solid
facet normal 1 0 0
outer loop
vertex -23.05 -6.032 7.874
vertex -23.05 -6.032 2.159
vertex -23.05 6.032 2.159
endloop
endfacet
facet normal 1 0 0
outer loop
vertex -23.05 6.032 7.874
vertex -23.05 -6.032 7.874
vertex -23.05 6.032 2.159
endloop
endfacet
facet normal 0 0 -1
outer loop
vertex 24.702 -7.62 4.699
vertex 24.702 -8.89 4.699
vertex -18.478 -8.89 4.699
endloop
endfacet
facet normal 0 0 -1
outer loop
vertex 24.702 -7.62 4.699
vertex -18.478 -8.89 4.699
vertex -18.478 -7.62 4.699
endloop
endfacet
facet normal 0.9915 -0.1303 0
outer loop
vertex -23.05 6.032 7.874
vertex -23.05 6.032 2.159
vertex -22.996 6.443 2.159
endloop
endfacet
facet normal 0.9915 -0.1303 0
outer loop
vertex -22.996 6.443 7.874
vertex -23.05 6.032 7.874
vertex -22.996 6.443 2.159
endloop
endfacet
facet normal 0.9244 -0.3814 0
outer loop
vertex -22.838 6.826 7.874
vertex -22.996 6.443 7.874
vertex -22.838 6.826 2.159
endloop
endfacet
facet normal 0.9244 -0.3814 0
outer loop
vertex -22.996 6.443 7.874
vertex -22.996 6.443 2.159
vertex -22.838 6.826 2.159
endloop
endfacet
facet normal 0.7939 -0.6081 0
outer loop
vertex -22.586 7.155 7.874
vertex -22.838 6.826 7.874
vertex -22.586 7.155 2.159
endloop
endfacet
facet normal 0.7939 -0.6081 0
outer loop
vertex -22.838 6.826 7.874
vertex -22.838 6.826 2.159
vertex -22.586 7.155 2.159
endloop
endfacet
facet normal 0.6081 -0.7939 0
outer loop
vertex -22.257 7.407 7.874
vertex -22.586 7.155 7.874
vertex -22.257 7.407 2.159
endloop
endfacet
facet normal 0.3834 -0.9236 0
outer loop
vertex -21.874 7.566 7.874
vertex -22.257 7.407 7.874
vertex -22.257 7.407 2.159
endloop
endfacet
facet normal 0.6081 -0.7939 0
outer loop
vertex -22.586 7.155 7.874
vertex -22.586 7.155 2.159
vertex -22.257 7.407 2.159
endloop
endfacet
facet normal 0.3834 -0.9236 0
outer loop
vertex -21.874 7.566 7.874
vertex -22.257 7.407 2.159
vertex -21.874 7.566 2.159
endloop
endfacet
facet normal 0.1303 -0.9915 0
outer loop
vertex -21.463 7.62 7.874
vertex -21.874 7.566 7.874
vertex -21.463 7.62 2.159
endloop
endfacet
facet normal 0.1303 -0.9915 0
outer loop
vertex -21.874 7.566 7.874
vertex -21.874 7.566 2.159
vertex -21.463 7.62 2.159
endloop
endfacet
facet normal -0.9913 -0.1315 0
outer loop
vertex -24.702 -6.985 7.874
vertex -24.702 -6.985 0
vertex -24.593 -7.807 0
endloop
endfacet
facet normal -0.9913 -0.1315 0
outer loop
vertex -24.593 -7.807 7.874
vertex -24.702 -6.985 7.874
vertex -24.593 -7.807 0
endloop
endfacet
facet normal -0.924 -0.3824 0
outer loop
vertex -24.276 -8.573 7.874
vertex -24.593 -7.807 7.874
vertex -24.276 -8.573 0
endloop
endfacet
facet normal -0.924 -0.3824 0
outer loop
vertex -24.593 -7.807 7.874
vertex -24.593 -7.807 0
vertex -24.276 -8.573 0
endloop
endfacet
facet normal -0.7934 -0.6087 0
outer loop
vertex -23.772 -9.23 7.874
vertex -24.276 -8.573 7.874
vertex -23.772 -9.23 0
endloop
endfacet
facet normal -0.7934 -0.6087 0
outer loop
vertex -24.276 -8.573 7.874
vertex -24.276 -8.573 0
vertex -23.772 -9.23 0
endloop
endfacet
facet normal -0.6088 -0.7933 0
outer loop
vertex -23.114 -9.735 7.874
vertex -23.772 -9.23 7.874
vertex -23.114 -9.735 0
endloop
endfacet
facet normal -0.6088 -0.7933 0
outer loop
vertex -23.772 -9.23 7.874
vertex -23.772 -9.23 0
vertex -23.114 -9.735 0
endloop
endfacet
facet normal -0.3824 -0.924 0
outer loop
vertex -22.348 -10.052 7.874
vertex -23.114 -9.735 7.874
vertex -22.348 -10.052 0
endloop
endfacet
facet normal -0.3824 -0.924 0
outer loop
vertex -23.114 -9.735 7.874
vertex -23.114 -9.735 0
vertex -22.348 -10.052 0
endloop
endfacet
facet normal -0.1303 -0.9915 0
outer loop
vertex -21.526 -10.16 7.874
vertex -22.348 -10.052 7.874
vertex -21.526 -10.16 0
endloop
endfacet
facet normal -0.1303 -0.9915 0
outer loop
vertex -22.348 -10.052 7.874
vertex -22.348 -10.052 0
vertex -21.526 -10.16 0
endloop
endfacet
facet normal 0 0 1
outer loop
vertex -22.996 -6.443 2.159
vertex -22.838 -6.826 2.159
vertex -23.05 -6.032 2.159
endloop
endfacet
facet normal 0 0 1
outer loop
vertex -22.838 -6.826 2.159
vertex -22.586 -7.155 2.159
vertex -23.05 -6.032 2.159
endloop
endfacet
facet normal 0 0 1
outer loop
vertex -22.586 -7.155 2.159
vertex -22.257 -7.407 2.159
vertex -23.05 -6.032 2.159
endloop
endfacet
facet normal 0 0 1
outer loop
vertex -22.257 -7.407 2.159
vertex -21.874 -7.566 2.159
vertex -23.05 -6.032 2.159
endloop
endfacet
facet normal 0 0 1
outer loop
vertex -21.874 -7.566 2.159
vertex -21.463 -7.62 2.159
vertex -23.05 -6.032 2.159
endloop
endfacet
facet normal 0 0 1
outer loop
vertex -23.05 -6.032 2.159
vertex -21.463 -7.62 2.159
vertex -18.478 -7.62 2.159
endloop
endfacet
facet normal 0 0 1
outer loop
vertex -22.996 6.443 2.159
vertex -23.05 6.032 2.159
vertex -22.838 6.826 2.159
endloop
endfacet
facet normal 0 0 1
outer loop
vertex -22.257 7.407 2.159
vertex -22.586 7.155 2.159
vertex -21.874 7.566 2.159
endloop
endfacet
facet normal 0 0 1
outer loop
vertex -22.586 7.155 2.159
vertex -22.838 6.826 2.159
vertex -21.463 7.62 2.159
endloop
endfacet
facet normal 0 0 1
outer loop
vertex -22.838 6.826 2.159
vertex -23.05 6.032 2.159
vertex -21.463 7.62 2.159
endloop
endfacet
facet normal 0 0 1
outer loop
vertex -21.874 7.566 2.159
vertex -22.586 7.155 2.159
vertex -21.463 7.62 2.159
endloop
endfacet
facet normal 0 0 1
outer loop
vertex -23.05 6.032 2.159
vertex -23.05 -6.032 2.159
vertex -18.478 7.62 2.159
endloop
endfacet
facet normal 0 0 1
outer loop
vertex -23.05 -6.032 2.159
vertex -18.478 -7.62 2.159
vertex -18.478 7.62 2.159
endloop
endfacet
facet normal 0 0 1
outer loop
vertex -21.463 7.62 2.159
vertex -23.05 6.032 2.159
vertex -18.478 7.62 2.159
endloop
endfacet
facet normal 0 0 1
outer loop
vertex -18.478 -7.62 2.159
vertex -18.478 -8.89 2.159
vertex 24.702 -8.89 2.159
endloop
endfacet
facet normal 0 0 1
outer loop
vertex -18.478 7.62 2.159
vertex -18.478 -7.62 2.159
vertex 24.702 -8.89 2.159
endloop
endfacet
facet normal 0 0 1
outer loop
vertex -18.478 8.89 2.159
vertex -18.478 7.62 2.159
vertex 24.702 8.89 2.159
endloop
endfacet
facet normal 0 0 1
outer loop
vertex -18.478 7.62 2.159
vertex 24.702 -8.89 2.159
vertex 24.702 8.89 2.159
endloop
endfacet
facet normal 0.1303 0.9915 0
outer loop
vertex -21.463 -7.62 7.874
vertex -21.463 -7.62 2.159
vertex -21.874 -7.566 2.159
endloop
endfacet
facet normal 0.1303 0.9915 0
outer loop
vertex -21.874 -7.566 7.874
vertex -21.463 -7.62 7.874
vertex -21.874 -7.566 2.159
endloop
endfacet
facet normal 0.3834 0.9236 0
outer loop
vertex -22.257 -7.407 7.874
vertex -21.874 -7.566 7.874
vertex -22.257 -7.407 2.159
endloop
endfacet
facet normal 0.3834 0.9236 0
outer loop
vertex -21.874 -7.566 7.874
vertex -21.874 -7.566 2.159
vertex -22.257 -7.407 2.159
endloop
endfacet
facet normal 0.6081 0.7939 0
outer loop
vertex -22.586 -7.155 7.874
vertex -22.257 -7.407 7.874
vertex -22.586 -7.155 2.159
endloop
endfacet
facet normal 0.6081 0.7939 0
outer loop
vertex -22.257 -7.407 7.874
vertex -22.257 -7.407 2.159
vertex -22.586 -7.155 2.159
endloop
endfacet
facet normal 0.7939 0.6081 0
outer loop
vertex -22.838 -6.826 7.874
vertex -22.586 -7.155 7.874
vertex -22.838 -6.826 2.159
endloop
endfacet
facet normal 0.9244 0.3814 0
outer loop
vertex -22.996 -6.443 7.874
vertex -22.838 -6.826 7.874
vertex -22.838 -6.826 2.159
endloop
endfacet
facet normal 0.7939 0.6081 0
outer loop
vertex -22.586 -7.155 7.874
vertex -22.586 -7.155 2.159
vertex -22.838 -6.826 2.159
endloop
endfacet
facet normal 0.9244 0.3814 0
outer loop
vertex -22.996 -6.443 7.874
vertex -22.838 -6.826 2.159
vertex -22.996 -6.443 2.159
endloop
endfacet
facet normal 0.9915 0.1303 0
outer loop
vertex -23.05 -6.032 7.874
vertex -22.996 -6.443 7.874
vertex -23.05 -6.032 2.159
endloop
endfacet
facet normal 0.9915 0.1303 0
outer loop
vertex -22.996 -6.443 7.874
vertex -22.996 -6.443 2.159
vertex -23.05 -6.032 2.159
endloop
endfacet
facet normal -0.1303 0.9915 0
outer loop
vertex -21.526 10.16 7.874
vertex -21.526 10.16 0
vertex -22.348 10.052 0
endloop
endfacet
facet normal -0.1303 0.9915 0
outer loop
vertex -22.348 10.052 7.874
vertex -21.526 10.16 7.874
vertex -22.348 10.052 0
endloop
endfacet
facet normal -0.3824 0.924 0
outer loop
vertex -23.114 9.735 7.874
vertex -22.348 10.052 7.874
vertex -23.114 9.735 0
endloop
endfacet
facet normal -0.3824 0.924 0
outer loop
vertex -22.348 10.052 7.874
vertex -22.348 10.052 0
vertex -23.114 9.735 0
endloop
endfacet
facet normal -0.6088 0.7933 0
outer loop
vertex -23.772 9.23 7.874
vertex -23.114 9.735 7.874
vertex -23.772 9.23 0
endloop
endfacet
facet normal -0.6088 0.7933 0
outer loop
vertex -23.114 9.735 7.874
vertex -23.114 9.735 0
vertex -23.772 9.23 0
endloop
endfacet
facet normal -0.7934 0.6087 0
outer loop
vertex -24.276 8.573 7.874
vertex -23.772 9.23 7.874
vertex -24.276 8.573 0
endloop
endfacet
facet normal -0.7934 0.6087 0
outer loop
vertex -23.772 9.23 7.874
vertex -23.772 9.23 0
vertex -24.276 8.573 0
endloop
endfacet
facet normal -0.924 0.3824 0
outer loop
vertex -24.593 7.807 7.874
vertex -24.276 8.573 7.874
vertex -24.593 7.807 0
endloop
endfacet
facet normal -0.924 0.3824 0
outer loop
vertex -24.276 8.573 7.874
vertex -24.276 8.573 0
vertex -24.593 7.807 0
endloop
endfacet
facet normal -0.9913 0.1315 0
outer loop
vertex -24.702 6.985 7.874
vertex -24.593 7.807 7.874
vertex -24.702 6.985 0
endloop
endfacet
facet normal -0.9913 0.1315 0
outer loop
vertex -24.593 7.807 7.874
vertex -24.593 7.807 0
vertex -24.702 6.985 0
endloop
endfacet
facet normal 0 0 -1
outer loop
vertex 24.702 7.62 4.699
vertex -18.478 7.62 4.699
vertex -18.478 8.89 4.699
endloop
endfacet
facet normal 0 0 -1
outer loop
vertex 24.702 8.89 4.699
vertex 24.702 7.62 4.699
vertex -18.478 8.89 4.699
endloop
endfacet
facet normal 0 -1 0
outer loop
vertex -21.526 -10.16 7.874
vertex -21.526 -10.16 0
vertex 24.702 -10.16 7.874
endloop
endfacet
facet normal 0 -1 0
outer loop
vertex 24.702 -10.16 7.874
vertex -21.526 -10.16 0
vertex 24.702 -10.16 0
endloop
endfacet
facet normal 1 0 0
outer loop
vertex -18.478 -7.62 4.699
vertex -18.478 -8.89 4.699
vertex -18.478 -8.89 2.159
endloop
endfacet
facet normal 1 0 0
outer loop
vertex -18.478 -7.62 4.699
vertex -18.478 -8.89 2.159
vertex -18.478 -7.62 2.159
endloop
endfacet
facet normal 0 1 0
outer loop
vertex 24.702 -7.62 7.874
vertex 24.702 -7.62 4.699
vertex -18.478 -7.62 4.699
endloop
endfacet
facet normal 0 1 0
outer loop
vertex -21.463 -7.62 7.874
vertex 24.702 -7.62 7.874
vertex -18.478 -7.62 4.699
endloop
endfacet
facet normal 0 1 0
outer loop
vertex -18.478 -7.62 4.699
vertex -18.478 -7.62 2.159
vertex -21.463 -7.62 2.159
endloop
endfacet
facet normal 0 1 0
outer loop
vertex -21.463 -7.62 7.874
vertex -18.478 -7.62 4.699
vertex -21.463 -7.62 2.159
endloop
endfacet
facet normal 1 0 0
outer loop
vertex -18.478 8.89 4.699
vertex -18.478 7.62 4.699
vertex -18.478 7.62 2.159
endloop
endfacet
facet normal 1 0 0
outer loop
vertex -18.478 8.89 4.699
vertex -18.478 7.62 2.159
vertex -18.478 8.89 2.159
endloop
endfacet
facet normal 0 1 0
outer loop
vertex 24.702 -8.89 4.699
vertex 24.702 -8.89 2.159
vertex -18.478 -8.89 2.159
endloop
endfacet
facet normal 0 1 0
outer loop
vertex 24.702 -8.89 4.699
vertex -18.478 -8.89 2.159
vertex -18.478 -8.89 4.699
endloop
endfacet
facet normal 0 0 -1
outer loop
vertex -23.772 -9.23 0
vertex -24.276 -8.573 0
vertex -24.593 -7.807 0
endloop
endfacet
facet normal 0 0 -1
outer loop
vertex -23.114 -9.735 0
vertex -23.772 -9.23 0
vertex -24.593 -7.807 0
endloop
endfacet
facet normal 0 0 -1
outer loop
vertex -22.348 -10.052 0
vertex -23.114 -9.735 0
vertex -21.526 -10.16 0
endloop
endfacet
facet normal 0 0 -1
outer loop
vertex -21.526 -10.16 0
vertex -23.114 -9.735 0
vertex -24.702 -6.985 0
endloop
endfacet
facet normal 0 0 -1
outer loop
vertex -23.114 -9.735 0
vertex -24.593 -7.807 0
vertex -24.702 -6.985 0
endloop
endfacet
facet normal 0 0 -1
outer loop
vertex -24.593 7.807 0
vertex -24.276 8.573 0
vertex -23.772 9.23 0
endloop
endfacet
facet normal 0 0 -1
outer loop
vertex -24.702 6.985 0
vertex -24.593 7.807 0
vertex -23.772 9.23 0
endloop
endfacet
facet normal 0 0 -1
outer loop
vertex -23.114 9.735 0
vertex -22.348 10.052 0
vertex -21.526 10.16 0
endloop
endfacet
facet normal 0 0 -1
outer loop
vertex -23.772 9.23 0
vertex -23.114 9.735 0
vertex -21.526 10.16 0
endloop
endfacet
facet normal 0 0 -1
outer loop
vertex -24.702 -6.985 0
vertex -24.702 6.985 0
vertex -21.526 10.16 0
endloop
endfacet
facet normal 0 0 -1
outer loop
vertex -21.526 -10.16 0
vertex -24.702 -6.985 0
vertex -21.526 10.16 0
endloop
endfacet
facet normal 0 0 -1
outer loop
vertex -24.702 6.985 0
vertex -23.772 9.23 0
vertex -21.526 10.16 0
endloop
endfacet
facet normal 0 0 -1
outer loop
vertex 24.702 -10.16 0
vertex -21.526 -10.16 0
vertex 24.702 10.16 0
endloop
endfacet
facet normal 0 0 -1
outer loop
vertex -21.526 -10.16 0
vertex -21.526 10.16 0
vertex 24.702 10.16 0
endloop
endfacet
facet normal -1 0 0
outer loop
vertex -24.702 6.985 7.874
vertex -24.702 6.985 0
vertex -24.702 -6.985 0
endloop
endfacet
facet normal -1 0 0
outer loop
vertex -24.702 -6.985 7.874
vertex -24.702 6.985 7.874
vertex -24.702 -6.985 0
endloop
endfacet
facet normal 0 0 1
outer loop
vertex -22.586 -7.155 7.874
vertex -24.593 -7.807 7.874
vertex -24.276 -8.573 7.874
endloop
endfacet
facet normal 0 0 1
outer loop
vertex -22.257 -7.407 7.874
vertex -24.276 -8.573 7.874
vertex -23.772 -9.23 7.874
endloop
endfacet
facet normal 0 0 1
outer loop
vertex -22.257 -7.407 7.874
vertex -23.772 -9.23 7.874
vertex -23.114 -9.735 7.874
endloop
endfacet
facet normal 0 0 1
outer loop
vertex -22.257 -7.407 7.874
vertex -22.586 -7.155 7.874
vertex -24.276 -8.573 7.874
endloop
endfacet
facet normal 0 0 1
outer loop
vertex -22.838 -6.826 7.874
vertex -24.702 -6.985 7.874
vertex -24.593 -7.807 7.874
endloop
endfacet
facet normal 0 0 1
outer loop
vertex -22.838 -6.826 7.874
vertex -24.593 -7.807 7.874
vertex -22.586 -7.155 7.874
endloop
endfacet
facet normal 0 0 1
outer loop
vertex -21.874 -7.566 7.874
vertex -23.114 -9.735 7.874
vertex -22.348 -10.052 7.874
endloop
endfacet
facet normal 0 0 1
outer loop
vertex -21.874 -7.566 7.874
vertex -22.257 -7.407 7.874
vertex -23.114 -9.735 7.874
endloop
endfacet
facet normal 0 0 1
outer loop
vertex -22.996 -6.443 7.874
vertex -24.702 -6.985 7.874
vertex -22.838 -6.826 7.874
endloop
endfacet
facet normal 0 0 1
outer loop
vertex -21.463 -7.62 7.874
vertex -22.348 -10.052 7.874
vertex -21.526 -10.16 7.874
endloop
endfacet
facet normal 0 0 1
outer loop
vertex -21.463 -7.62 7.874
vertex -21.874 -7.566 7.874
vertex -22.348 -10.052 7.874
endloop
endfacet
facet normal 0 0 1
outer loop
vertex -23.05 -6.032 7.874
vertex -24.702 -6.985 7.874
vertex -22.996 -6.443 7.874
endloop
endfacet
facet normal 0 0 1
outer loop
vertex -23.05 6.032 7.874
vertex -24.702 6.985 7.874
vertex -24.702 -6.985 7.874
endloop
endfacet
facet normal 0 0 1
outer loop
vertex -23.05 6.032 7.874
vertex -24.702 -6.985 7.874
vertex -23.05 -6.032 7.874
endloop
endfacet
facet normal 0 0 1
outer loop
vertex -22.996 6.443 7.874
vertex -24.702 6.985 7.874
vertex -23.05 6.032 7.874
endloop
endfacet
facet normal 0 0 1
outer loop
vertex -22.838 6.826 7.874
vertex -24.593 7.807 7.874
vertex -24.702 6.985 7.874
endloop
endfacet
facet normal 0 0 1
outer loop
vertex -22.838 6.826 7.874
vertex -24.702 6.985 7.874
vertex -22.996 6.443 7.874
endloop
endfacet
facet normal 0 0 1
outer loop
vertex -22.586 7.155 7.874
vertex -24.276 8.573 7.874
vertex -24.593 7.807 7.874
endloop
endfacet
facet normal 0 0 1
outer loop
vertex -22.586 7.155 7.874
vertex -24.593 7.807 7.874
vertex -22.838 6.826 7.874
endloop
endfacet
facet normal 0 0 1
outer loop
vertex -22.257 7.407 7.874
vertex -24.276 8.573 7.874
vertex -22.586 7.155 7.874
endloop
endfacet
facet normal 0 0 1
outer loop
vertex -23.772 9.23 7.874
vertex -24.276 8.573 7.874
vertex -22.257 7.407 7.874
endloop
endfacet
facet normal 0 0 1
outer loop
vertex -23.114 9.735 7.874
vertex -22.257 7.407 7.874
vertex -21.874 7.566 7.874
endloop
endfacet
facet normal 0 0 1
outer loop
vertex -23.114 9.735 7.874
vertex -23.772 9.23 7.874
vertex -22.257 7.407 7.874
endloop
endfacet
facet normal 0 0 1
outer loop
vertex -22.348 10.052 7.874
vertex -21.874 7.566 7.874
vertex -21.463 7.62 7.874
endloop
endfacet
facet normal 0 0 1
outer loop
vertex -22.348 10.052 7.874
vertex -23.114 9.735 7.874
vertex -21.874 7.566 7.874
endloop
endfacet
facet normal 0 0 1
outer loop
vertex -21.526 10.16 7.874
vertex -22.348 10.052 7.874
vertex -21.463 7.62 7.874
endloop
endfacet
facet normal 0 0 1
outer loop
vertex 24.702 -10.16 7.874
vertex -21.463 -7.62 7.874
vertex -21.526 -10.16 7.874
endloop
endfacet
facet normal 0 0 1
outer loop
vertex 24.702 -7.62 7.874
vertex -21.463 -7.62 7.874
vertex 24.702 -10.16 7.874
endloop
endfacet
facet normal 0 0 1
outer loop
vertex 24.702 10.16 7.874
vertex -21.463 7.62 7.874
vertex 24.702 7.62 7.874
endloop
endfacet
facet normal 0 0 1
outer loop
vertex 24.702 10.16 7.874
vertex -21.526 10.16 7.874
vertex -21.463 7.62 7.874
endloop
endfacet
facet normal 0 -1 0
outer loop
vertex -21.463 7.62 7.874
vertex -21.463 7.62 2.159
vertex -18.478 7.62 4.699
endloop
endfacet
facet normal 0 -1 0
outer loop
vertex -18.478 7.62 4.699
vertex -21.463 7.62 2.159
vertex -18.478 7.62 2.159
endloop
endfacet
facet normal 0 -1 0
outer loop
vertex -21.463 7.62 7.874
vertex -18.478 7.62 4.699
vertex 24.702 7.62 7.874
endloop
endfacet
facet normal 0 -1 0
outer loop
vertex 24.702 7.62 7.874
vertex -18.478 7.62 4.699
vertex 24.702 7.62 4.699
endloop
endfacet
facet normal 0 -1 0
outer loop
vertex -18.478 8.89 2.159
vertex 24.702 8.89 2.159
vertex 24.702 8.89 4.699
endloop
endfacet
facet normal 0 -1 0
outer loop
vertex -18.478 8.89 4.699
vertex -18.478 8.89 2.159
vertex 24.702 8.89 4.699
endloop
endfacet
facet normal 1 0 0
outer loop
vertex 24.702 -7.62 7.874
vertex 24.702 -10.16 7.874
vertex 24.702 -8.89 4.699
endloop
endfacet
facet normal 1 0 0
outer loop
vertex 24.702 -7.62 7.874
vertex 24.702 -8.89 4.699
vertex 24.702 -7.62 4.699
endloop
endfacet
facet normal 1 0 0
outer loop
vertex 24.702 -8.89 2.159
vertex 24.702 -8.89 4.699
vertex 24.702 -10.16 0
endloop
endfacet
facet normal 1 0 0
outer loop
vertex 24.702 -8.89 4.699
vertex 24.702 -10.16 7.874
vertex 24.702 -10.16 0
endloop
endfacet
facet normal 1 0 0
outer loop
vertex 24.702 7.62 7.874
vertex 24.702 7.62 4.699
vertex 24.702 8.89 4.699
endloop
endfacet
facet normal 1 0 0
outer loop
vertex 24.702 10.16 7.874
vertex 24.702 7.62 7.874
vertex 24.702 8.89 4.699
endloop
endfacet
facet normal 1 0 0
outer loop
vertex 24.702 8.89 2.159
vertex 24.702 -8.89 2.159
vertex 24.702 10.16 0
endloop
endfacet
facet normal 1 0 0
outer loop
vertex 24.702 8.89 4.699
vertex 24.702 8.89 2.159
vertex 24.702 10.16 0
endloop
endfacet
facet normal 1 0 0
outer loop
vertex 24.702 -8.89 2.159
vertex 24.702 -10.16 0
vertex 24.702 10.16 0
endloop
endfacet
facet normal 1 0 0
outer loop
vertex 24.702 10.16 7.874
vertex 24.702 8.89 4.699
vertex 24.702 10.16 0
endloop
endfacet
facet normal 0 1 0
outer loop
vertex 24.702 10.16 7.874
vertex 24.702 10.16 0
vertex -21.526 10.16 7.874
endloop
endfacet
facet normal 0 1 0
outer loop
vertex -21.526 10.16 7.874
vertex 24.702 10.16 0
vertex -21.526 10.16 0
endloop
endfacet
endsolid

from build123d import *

# Parameters (mm, degrees)
F1_DEPTH = 7.874
F0_R     = 2.286
F2_DEPTH = 2.159
F3_W     = 17.78
F3_H     = 2.54
F4_DEPTH = 43.18


with BuildPart() as f1:
    # F0 (on Top) → F1 (new body)
    with BuildSketch(Plane.XY):
        with BuildLine():
            ThreePointArc((-24.7015, -6.985), (-23.7715640303, -9.2300640303), (-21.5265, -10.16))
            Line((-21.5265, -10.16), (24.7015, -10.16))
            Line((24.7015, -10.16), (24.7015, -7.62))
            Line((24.7015, -7.62), (-21.463, -7.62))
            ThreePointArc((-21.463, -7.62), (-22.5855320151, -7.1550320151), (-23.0505, -6.0325))
            Line((-23.0505, -6.0325), (-23.0505, 6.0325))
            ThreePointArc((-23.0505, 6.0325), (-22.5855320151, 7.1550320151), (-21.463, 7.62))
            Line((-21.463, 7.62), (24.7015, 7.62))
            Line((24.7015, 7.62), (24.7015, 10.16))
            Line((24.7015, 10.16), (-21.5265, 10.16))
            ThreePointArc((-21.5265, 10.16), (-23.7715640303, 9.2300640303), (-24.7015, 6.985))
            Line((-24.7015, 6.985), (-24.7015, -6.985))
        make_face()
    extrude(amount=F1_DEPTH)

    # F0 (on Top) → F2 (join)
    with BuildSketch(Plane.XY):
        with BuildLine():
            Line((-21.463, -7.62), (24.7015, -7.62))
            Line((24.7015, -7.62), (24.7015, 7.62))
            Line((24.7015, 7.62), (-21.463, 7.62))
            ThreePointArc((-21.463, 7.62), (-22.5855320151, 7.1550320151), (-23.0505, 6.0325))
            Line((-23.0505, 6.0325), (-23.0505, -6.0325))
            ThreePointArc((-23.0505, -6.0325), (-22.5855320151, -7.1550320151), (-21.463, -7.62))
        make_face()
        with Locations((2.9845, 0)):
            Circle(F0_R, mode=Mode.SUBTRACT)
        with Locations((2.9845, 0)):
            Circle(F0_R)
    extrude(amount=F2_DEPTH)

    # F3 (on face) → F4 (cut)
    with BuildSketch(Plane.YZ.offset(24.7015)):
        with Locations((0, 3.429)):
            Rectangle(F3_W, F3_H)
    extrude(amount=-F4_DEPTH, mode=Mode.SUBTRACT)


solid = f1.part
